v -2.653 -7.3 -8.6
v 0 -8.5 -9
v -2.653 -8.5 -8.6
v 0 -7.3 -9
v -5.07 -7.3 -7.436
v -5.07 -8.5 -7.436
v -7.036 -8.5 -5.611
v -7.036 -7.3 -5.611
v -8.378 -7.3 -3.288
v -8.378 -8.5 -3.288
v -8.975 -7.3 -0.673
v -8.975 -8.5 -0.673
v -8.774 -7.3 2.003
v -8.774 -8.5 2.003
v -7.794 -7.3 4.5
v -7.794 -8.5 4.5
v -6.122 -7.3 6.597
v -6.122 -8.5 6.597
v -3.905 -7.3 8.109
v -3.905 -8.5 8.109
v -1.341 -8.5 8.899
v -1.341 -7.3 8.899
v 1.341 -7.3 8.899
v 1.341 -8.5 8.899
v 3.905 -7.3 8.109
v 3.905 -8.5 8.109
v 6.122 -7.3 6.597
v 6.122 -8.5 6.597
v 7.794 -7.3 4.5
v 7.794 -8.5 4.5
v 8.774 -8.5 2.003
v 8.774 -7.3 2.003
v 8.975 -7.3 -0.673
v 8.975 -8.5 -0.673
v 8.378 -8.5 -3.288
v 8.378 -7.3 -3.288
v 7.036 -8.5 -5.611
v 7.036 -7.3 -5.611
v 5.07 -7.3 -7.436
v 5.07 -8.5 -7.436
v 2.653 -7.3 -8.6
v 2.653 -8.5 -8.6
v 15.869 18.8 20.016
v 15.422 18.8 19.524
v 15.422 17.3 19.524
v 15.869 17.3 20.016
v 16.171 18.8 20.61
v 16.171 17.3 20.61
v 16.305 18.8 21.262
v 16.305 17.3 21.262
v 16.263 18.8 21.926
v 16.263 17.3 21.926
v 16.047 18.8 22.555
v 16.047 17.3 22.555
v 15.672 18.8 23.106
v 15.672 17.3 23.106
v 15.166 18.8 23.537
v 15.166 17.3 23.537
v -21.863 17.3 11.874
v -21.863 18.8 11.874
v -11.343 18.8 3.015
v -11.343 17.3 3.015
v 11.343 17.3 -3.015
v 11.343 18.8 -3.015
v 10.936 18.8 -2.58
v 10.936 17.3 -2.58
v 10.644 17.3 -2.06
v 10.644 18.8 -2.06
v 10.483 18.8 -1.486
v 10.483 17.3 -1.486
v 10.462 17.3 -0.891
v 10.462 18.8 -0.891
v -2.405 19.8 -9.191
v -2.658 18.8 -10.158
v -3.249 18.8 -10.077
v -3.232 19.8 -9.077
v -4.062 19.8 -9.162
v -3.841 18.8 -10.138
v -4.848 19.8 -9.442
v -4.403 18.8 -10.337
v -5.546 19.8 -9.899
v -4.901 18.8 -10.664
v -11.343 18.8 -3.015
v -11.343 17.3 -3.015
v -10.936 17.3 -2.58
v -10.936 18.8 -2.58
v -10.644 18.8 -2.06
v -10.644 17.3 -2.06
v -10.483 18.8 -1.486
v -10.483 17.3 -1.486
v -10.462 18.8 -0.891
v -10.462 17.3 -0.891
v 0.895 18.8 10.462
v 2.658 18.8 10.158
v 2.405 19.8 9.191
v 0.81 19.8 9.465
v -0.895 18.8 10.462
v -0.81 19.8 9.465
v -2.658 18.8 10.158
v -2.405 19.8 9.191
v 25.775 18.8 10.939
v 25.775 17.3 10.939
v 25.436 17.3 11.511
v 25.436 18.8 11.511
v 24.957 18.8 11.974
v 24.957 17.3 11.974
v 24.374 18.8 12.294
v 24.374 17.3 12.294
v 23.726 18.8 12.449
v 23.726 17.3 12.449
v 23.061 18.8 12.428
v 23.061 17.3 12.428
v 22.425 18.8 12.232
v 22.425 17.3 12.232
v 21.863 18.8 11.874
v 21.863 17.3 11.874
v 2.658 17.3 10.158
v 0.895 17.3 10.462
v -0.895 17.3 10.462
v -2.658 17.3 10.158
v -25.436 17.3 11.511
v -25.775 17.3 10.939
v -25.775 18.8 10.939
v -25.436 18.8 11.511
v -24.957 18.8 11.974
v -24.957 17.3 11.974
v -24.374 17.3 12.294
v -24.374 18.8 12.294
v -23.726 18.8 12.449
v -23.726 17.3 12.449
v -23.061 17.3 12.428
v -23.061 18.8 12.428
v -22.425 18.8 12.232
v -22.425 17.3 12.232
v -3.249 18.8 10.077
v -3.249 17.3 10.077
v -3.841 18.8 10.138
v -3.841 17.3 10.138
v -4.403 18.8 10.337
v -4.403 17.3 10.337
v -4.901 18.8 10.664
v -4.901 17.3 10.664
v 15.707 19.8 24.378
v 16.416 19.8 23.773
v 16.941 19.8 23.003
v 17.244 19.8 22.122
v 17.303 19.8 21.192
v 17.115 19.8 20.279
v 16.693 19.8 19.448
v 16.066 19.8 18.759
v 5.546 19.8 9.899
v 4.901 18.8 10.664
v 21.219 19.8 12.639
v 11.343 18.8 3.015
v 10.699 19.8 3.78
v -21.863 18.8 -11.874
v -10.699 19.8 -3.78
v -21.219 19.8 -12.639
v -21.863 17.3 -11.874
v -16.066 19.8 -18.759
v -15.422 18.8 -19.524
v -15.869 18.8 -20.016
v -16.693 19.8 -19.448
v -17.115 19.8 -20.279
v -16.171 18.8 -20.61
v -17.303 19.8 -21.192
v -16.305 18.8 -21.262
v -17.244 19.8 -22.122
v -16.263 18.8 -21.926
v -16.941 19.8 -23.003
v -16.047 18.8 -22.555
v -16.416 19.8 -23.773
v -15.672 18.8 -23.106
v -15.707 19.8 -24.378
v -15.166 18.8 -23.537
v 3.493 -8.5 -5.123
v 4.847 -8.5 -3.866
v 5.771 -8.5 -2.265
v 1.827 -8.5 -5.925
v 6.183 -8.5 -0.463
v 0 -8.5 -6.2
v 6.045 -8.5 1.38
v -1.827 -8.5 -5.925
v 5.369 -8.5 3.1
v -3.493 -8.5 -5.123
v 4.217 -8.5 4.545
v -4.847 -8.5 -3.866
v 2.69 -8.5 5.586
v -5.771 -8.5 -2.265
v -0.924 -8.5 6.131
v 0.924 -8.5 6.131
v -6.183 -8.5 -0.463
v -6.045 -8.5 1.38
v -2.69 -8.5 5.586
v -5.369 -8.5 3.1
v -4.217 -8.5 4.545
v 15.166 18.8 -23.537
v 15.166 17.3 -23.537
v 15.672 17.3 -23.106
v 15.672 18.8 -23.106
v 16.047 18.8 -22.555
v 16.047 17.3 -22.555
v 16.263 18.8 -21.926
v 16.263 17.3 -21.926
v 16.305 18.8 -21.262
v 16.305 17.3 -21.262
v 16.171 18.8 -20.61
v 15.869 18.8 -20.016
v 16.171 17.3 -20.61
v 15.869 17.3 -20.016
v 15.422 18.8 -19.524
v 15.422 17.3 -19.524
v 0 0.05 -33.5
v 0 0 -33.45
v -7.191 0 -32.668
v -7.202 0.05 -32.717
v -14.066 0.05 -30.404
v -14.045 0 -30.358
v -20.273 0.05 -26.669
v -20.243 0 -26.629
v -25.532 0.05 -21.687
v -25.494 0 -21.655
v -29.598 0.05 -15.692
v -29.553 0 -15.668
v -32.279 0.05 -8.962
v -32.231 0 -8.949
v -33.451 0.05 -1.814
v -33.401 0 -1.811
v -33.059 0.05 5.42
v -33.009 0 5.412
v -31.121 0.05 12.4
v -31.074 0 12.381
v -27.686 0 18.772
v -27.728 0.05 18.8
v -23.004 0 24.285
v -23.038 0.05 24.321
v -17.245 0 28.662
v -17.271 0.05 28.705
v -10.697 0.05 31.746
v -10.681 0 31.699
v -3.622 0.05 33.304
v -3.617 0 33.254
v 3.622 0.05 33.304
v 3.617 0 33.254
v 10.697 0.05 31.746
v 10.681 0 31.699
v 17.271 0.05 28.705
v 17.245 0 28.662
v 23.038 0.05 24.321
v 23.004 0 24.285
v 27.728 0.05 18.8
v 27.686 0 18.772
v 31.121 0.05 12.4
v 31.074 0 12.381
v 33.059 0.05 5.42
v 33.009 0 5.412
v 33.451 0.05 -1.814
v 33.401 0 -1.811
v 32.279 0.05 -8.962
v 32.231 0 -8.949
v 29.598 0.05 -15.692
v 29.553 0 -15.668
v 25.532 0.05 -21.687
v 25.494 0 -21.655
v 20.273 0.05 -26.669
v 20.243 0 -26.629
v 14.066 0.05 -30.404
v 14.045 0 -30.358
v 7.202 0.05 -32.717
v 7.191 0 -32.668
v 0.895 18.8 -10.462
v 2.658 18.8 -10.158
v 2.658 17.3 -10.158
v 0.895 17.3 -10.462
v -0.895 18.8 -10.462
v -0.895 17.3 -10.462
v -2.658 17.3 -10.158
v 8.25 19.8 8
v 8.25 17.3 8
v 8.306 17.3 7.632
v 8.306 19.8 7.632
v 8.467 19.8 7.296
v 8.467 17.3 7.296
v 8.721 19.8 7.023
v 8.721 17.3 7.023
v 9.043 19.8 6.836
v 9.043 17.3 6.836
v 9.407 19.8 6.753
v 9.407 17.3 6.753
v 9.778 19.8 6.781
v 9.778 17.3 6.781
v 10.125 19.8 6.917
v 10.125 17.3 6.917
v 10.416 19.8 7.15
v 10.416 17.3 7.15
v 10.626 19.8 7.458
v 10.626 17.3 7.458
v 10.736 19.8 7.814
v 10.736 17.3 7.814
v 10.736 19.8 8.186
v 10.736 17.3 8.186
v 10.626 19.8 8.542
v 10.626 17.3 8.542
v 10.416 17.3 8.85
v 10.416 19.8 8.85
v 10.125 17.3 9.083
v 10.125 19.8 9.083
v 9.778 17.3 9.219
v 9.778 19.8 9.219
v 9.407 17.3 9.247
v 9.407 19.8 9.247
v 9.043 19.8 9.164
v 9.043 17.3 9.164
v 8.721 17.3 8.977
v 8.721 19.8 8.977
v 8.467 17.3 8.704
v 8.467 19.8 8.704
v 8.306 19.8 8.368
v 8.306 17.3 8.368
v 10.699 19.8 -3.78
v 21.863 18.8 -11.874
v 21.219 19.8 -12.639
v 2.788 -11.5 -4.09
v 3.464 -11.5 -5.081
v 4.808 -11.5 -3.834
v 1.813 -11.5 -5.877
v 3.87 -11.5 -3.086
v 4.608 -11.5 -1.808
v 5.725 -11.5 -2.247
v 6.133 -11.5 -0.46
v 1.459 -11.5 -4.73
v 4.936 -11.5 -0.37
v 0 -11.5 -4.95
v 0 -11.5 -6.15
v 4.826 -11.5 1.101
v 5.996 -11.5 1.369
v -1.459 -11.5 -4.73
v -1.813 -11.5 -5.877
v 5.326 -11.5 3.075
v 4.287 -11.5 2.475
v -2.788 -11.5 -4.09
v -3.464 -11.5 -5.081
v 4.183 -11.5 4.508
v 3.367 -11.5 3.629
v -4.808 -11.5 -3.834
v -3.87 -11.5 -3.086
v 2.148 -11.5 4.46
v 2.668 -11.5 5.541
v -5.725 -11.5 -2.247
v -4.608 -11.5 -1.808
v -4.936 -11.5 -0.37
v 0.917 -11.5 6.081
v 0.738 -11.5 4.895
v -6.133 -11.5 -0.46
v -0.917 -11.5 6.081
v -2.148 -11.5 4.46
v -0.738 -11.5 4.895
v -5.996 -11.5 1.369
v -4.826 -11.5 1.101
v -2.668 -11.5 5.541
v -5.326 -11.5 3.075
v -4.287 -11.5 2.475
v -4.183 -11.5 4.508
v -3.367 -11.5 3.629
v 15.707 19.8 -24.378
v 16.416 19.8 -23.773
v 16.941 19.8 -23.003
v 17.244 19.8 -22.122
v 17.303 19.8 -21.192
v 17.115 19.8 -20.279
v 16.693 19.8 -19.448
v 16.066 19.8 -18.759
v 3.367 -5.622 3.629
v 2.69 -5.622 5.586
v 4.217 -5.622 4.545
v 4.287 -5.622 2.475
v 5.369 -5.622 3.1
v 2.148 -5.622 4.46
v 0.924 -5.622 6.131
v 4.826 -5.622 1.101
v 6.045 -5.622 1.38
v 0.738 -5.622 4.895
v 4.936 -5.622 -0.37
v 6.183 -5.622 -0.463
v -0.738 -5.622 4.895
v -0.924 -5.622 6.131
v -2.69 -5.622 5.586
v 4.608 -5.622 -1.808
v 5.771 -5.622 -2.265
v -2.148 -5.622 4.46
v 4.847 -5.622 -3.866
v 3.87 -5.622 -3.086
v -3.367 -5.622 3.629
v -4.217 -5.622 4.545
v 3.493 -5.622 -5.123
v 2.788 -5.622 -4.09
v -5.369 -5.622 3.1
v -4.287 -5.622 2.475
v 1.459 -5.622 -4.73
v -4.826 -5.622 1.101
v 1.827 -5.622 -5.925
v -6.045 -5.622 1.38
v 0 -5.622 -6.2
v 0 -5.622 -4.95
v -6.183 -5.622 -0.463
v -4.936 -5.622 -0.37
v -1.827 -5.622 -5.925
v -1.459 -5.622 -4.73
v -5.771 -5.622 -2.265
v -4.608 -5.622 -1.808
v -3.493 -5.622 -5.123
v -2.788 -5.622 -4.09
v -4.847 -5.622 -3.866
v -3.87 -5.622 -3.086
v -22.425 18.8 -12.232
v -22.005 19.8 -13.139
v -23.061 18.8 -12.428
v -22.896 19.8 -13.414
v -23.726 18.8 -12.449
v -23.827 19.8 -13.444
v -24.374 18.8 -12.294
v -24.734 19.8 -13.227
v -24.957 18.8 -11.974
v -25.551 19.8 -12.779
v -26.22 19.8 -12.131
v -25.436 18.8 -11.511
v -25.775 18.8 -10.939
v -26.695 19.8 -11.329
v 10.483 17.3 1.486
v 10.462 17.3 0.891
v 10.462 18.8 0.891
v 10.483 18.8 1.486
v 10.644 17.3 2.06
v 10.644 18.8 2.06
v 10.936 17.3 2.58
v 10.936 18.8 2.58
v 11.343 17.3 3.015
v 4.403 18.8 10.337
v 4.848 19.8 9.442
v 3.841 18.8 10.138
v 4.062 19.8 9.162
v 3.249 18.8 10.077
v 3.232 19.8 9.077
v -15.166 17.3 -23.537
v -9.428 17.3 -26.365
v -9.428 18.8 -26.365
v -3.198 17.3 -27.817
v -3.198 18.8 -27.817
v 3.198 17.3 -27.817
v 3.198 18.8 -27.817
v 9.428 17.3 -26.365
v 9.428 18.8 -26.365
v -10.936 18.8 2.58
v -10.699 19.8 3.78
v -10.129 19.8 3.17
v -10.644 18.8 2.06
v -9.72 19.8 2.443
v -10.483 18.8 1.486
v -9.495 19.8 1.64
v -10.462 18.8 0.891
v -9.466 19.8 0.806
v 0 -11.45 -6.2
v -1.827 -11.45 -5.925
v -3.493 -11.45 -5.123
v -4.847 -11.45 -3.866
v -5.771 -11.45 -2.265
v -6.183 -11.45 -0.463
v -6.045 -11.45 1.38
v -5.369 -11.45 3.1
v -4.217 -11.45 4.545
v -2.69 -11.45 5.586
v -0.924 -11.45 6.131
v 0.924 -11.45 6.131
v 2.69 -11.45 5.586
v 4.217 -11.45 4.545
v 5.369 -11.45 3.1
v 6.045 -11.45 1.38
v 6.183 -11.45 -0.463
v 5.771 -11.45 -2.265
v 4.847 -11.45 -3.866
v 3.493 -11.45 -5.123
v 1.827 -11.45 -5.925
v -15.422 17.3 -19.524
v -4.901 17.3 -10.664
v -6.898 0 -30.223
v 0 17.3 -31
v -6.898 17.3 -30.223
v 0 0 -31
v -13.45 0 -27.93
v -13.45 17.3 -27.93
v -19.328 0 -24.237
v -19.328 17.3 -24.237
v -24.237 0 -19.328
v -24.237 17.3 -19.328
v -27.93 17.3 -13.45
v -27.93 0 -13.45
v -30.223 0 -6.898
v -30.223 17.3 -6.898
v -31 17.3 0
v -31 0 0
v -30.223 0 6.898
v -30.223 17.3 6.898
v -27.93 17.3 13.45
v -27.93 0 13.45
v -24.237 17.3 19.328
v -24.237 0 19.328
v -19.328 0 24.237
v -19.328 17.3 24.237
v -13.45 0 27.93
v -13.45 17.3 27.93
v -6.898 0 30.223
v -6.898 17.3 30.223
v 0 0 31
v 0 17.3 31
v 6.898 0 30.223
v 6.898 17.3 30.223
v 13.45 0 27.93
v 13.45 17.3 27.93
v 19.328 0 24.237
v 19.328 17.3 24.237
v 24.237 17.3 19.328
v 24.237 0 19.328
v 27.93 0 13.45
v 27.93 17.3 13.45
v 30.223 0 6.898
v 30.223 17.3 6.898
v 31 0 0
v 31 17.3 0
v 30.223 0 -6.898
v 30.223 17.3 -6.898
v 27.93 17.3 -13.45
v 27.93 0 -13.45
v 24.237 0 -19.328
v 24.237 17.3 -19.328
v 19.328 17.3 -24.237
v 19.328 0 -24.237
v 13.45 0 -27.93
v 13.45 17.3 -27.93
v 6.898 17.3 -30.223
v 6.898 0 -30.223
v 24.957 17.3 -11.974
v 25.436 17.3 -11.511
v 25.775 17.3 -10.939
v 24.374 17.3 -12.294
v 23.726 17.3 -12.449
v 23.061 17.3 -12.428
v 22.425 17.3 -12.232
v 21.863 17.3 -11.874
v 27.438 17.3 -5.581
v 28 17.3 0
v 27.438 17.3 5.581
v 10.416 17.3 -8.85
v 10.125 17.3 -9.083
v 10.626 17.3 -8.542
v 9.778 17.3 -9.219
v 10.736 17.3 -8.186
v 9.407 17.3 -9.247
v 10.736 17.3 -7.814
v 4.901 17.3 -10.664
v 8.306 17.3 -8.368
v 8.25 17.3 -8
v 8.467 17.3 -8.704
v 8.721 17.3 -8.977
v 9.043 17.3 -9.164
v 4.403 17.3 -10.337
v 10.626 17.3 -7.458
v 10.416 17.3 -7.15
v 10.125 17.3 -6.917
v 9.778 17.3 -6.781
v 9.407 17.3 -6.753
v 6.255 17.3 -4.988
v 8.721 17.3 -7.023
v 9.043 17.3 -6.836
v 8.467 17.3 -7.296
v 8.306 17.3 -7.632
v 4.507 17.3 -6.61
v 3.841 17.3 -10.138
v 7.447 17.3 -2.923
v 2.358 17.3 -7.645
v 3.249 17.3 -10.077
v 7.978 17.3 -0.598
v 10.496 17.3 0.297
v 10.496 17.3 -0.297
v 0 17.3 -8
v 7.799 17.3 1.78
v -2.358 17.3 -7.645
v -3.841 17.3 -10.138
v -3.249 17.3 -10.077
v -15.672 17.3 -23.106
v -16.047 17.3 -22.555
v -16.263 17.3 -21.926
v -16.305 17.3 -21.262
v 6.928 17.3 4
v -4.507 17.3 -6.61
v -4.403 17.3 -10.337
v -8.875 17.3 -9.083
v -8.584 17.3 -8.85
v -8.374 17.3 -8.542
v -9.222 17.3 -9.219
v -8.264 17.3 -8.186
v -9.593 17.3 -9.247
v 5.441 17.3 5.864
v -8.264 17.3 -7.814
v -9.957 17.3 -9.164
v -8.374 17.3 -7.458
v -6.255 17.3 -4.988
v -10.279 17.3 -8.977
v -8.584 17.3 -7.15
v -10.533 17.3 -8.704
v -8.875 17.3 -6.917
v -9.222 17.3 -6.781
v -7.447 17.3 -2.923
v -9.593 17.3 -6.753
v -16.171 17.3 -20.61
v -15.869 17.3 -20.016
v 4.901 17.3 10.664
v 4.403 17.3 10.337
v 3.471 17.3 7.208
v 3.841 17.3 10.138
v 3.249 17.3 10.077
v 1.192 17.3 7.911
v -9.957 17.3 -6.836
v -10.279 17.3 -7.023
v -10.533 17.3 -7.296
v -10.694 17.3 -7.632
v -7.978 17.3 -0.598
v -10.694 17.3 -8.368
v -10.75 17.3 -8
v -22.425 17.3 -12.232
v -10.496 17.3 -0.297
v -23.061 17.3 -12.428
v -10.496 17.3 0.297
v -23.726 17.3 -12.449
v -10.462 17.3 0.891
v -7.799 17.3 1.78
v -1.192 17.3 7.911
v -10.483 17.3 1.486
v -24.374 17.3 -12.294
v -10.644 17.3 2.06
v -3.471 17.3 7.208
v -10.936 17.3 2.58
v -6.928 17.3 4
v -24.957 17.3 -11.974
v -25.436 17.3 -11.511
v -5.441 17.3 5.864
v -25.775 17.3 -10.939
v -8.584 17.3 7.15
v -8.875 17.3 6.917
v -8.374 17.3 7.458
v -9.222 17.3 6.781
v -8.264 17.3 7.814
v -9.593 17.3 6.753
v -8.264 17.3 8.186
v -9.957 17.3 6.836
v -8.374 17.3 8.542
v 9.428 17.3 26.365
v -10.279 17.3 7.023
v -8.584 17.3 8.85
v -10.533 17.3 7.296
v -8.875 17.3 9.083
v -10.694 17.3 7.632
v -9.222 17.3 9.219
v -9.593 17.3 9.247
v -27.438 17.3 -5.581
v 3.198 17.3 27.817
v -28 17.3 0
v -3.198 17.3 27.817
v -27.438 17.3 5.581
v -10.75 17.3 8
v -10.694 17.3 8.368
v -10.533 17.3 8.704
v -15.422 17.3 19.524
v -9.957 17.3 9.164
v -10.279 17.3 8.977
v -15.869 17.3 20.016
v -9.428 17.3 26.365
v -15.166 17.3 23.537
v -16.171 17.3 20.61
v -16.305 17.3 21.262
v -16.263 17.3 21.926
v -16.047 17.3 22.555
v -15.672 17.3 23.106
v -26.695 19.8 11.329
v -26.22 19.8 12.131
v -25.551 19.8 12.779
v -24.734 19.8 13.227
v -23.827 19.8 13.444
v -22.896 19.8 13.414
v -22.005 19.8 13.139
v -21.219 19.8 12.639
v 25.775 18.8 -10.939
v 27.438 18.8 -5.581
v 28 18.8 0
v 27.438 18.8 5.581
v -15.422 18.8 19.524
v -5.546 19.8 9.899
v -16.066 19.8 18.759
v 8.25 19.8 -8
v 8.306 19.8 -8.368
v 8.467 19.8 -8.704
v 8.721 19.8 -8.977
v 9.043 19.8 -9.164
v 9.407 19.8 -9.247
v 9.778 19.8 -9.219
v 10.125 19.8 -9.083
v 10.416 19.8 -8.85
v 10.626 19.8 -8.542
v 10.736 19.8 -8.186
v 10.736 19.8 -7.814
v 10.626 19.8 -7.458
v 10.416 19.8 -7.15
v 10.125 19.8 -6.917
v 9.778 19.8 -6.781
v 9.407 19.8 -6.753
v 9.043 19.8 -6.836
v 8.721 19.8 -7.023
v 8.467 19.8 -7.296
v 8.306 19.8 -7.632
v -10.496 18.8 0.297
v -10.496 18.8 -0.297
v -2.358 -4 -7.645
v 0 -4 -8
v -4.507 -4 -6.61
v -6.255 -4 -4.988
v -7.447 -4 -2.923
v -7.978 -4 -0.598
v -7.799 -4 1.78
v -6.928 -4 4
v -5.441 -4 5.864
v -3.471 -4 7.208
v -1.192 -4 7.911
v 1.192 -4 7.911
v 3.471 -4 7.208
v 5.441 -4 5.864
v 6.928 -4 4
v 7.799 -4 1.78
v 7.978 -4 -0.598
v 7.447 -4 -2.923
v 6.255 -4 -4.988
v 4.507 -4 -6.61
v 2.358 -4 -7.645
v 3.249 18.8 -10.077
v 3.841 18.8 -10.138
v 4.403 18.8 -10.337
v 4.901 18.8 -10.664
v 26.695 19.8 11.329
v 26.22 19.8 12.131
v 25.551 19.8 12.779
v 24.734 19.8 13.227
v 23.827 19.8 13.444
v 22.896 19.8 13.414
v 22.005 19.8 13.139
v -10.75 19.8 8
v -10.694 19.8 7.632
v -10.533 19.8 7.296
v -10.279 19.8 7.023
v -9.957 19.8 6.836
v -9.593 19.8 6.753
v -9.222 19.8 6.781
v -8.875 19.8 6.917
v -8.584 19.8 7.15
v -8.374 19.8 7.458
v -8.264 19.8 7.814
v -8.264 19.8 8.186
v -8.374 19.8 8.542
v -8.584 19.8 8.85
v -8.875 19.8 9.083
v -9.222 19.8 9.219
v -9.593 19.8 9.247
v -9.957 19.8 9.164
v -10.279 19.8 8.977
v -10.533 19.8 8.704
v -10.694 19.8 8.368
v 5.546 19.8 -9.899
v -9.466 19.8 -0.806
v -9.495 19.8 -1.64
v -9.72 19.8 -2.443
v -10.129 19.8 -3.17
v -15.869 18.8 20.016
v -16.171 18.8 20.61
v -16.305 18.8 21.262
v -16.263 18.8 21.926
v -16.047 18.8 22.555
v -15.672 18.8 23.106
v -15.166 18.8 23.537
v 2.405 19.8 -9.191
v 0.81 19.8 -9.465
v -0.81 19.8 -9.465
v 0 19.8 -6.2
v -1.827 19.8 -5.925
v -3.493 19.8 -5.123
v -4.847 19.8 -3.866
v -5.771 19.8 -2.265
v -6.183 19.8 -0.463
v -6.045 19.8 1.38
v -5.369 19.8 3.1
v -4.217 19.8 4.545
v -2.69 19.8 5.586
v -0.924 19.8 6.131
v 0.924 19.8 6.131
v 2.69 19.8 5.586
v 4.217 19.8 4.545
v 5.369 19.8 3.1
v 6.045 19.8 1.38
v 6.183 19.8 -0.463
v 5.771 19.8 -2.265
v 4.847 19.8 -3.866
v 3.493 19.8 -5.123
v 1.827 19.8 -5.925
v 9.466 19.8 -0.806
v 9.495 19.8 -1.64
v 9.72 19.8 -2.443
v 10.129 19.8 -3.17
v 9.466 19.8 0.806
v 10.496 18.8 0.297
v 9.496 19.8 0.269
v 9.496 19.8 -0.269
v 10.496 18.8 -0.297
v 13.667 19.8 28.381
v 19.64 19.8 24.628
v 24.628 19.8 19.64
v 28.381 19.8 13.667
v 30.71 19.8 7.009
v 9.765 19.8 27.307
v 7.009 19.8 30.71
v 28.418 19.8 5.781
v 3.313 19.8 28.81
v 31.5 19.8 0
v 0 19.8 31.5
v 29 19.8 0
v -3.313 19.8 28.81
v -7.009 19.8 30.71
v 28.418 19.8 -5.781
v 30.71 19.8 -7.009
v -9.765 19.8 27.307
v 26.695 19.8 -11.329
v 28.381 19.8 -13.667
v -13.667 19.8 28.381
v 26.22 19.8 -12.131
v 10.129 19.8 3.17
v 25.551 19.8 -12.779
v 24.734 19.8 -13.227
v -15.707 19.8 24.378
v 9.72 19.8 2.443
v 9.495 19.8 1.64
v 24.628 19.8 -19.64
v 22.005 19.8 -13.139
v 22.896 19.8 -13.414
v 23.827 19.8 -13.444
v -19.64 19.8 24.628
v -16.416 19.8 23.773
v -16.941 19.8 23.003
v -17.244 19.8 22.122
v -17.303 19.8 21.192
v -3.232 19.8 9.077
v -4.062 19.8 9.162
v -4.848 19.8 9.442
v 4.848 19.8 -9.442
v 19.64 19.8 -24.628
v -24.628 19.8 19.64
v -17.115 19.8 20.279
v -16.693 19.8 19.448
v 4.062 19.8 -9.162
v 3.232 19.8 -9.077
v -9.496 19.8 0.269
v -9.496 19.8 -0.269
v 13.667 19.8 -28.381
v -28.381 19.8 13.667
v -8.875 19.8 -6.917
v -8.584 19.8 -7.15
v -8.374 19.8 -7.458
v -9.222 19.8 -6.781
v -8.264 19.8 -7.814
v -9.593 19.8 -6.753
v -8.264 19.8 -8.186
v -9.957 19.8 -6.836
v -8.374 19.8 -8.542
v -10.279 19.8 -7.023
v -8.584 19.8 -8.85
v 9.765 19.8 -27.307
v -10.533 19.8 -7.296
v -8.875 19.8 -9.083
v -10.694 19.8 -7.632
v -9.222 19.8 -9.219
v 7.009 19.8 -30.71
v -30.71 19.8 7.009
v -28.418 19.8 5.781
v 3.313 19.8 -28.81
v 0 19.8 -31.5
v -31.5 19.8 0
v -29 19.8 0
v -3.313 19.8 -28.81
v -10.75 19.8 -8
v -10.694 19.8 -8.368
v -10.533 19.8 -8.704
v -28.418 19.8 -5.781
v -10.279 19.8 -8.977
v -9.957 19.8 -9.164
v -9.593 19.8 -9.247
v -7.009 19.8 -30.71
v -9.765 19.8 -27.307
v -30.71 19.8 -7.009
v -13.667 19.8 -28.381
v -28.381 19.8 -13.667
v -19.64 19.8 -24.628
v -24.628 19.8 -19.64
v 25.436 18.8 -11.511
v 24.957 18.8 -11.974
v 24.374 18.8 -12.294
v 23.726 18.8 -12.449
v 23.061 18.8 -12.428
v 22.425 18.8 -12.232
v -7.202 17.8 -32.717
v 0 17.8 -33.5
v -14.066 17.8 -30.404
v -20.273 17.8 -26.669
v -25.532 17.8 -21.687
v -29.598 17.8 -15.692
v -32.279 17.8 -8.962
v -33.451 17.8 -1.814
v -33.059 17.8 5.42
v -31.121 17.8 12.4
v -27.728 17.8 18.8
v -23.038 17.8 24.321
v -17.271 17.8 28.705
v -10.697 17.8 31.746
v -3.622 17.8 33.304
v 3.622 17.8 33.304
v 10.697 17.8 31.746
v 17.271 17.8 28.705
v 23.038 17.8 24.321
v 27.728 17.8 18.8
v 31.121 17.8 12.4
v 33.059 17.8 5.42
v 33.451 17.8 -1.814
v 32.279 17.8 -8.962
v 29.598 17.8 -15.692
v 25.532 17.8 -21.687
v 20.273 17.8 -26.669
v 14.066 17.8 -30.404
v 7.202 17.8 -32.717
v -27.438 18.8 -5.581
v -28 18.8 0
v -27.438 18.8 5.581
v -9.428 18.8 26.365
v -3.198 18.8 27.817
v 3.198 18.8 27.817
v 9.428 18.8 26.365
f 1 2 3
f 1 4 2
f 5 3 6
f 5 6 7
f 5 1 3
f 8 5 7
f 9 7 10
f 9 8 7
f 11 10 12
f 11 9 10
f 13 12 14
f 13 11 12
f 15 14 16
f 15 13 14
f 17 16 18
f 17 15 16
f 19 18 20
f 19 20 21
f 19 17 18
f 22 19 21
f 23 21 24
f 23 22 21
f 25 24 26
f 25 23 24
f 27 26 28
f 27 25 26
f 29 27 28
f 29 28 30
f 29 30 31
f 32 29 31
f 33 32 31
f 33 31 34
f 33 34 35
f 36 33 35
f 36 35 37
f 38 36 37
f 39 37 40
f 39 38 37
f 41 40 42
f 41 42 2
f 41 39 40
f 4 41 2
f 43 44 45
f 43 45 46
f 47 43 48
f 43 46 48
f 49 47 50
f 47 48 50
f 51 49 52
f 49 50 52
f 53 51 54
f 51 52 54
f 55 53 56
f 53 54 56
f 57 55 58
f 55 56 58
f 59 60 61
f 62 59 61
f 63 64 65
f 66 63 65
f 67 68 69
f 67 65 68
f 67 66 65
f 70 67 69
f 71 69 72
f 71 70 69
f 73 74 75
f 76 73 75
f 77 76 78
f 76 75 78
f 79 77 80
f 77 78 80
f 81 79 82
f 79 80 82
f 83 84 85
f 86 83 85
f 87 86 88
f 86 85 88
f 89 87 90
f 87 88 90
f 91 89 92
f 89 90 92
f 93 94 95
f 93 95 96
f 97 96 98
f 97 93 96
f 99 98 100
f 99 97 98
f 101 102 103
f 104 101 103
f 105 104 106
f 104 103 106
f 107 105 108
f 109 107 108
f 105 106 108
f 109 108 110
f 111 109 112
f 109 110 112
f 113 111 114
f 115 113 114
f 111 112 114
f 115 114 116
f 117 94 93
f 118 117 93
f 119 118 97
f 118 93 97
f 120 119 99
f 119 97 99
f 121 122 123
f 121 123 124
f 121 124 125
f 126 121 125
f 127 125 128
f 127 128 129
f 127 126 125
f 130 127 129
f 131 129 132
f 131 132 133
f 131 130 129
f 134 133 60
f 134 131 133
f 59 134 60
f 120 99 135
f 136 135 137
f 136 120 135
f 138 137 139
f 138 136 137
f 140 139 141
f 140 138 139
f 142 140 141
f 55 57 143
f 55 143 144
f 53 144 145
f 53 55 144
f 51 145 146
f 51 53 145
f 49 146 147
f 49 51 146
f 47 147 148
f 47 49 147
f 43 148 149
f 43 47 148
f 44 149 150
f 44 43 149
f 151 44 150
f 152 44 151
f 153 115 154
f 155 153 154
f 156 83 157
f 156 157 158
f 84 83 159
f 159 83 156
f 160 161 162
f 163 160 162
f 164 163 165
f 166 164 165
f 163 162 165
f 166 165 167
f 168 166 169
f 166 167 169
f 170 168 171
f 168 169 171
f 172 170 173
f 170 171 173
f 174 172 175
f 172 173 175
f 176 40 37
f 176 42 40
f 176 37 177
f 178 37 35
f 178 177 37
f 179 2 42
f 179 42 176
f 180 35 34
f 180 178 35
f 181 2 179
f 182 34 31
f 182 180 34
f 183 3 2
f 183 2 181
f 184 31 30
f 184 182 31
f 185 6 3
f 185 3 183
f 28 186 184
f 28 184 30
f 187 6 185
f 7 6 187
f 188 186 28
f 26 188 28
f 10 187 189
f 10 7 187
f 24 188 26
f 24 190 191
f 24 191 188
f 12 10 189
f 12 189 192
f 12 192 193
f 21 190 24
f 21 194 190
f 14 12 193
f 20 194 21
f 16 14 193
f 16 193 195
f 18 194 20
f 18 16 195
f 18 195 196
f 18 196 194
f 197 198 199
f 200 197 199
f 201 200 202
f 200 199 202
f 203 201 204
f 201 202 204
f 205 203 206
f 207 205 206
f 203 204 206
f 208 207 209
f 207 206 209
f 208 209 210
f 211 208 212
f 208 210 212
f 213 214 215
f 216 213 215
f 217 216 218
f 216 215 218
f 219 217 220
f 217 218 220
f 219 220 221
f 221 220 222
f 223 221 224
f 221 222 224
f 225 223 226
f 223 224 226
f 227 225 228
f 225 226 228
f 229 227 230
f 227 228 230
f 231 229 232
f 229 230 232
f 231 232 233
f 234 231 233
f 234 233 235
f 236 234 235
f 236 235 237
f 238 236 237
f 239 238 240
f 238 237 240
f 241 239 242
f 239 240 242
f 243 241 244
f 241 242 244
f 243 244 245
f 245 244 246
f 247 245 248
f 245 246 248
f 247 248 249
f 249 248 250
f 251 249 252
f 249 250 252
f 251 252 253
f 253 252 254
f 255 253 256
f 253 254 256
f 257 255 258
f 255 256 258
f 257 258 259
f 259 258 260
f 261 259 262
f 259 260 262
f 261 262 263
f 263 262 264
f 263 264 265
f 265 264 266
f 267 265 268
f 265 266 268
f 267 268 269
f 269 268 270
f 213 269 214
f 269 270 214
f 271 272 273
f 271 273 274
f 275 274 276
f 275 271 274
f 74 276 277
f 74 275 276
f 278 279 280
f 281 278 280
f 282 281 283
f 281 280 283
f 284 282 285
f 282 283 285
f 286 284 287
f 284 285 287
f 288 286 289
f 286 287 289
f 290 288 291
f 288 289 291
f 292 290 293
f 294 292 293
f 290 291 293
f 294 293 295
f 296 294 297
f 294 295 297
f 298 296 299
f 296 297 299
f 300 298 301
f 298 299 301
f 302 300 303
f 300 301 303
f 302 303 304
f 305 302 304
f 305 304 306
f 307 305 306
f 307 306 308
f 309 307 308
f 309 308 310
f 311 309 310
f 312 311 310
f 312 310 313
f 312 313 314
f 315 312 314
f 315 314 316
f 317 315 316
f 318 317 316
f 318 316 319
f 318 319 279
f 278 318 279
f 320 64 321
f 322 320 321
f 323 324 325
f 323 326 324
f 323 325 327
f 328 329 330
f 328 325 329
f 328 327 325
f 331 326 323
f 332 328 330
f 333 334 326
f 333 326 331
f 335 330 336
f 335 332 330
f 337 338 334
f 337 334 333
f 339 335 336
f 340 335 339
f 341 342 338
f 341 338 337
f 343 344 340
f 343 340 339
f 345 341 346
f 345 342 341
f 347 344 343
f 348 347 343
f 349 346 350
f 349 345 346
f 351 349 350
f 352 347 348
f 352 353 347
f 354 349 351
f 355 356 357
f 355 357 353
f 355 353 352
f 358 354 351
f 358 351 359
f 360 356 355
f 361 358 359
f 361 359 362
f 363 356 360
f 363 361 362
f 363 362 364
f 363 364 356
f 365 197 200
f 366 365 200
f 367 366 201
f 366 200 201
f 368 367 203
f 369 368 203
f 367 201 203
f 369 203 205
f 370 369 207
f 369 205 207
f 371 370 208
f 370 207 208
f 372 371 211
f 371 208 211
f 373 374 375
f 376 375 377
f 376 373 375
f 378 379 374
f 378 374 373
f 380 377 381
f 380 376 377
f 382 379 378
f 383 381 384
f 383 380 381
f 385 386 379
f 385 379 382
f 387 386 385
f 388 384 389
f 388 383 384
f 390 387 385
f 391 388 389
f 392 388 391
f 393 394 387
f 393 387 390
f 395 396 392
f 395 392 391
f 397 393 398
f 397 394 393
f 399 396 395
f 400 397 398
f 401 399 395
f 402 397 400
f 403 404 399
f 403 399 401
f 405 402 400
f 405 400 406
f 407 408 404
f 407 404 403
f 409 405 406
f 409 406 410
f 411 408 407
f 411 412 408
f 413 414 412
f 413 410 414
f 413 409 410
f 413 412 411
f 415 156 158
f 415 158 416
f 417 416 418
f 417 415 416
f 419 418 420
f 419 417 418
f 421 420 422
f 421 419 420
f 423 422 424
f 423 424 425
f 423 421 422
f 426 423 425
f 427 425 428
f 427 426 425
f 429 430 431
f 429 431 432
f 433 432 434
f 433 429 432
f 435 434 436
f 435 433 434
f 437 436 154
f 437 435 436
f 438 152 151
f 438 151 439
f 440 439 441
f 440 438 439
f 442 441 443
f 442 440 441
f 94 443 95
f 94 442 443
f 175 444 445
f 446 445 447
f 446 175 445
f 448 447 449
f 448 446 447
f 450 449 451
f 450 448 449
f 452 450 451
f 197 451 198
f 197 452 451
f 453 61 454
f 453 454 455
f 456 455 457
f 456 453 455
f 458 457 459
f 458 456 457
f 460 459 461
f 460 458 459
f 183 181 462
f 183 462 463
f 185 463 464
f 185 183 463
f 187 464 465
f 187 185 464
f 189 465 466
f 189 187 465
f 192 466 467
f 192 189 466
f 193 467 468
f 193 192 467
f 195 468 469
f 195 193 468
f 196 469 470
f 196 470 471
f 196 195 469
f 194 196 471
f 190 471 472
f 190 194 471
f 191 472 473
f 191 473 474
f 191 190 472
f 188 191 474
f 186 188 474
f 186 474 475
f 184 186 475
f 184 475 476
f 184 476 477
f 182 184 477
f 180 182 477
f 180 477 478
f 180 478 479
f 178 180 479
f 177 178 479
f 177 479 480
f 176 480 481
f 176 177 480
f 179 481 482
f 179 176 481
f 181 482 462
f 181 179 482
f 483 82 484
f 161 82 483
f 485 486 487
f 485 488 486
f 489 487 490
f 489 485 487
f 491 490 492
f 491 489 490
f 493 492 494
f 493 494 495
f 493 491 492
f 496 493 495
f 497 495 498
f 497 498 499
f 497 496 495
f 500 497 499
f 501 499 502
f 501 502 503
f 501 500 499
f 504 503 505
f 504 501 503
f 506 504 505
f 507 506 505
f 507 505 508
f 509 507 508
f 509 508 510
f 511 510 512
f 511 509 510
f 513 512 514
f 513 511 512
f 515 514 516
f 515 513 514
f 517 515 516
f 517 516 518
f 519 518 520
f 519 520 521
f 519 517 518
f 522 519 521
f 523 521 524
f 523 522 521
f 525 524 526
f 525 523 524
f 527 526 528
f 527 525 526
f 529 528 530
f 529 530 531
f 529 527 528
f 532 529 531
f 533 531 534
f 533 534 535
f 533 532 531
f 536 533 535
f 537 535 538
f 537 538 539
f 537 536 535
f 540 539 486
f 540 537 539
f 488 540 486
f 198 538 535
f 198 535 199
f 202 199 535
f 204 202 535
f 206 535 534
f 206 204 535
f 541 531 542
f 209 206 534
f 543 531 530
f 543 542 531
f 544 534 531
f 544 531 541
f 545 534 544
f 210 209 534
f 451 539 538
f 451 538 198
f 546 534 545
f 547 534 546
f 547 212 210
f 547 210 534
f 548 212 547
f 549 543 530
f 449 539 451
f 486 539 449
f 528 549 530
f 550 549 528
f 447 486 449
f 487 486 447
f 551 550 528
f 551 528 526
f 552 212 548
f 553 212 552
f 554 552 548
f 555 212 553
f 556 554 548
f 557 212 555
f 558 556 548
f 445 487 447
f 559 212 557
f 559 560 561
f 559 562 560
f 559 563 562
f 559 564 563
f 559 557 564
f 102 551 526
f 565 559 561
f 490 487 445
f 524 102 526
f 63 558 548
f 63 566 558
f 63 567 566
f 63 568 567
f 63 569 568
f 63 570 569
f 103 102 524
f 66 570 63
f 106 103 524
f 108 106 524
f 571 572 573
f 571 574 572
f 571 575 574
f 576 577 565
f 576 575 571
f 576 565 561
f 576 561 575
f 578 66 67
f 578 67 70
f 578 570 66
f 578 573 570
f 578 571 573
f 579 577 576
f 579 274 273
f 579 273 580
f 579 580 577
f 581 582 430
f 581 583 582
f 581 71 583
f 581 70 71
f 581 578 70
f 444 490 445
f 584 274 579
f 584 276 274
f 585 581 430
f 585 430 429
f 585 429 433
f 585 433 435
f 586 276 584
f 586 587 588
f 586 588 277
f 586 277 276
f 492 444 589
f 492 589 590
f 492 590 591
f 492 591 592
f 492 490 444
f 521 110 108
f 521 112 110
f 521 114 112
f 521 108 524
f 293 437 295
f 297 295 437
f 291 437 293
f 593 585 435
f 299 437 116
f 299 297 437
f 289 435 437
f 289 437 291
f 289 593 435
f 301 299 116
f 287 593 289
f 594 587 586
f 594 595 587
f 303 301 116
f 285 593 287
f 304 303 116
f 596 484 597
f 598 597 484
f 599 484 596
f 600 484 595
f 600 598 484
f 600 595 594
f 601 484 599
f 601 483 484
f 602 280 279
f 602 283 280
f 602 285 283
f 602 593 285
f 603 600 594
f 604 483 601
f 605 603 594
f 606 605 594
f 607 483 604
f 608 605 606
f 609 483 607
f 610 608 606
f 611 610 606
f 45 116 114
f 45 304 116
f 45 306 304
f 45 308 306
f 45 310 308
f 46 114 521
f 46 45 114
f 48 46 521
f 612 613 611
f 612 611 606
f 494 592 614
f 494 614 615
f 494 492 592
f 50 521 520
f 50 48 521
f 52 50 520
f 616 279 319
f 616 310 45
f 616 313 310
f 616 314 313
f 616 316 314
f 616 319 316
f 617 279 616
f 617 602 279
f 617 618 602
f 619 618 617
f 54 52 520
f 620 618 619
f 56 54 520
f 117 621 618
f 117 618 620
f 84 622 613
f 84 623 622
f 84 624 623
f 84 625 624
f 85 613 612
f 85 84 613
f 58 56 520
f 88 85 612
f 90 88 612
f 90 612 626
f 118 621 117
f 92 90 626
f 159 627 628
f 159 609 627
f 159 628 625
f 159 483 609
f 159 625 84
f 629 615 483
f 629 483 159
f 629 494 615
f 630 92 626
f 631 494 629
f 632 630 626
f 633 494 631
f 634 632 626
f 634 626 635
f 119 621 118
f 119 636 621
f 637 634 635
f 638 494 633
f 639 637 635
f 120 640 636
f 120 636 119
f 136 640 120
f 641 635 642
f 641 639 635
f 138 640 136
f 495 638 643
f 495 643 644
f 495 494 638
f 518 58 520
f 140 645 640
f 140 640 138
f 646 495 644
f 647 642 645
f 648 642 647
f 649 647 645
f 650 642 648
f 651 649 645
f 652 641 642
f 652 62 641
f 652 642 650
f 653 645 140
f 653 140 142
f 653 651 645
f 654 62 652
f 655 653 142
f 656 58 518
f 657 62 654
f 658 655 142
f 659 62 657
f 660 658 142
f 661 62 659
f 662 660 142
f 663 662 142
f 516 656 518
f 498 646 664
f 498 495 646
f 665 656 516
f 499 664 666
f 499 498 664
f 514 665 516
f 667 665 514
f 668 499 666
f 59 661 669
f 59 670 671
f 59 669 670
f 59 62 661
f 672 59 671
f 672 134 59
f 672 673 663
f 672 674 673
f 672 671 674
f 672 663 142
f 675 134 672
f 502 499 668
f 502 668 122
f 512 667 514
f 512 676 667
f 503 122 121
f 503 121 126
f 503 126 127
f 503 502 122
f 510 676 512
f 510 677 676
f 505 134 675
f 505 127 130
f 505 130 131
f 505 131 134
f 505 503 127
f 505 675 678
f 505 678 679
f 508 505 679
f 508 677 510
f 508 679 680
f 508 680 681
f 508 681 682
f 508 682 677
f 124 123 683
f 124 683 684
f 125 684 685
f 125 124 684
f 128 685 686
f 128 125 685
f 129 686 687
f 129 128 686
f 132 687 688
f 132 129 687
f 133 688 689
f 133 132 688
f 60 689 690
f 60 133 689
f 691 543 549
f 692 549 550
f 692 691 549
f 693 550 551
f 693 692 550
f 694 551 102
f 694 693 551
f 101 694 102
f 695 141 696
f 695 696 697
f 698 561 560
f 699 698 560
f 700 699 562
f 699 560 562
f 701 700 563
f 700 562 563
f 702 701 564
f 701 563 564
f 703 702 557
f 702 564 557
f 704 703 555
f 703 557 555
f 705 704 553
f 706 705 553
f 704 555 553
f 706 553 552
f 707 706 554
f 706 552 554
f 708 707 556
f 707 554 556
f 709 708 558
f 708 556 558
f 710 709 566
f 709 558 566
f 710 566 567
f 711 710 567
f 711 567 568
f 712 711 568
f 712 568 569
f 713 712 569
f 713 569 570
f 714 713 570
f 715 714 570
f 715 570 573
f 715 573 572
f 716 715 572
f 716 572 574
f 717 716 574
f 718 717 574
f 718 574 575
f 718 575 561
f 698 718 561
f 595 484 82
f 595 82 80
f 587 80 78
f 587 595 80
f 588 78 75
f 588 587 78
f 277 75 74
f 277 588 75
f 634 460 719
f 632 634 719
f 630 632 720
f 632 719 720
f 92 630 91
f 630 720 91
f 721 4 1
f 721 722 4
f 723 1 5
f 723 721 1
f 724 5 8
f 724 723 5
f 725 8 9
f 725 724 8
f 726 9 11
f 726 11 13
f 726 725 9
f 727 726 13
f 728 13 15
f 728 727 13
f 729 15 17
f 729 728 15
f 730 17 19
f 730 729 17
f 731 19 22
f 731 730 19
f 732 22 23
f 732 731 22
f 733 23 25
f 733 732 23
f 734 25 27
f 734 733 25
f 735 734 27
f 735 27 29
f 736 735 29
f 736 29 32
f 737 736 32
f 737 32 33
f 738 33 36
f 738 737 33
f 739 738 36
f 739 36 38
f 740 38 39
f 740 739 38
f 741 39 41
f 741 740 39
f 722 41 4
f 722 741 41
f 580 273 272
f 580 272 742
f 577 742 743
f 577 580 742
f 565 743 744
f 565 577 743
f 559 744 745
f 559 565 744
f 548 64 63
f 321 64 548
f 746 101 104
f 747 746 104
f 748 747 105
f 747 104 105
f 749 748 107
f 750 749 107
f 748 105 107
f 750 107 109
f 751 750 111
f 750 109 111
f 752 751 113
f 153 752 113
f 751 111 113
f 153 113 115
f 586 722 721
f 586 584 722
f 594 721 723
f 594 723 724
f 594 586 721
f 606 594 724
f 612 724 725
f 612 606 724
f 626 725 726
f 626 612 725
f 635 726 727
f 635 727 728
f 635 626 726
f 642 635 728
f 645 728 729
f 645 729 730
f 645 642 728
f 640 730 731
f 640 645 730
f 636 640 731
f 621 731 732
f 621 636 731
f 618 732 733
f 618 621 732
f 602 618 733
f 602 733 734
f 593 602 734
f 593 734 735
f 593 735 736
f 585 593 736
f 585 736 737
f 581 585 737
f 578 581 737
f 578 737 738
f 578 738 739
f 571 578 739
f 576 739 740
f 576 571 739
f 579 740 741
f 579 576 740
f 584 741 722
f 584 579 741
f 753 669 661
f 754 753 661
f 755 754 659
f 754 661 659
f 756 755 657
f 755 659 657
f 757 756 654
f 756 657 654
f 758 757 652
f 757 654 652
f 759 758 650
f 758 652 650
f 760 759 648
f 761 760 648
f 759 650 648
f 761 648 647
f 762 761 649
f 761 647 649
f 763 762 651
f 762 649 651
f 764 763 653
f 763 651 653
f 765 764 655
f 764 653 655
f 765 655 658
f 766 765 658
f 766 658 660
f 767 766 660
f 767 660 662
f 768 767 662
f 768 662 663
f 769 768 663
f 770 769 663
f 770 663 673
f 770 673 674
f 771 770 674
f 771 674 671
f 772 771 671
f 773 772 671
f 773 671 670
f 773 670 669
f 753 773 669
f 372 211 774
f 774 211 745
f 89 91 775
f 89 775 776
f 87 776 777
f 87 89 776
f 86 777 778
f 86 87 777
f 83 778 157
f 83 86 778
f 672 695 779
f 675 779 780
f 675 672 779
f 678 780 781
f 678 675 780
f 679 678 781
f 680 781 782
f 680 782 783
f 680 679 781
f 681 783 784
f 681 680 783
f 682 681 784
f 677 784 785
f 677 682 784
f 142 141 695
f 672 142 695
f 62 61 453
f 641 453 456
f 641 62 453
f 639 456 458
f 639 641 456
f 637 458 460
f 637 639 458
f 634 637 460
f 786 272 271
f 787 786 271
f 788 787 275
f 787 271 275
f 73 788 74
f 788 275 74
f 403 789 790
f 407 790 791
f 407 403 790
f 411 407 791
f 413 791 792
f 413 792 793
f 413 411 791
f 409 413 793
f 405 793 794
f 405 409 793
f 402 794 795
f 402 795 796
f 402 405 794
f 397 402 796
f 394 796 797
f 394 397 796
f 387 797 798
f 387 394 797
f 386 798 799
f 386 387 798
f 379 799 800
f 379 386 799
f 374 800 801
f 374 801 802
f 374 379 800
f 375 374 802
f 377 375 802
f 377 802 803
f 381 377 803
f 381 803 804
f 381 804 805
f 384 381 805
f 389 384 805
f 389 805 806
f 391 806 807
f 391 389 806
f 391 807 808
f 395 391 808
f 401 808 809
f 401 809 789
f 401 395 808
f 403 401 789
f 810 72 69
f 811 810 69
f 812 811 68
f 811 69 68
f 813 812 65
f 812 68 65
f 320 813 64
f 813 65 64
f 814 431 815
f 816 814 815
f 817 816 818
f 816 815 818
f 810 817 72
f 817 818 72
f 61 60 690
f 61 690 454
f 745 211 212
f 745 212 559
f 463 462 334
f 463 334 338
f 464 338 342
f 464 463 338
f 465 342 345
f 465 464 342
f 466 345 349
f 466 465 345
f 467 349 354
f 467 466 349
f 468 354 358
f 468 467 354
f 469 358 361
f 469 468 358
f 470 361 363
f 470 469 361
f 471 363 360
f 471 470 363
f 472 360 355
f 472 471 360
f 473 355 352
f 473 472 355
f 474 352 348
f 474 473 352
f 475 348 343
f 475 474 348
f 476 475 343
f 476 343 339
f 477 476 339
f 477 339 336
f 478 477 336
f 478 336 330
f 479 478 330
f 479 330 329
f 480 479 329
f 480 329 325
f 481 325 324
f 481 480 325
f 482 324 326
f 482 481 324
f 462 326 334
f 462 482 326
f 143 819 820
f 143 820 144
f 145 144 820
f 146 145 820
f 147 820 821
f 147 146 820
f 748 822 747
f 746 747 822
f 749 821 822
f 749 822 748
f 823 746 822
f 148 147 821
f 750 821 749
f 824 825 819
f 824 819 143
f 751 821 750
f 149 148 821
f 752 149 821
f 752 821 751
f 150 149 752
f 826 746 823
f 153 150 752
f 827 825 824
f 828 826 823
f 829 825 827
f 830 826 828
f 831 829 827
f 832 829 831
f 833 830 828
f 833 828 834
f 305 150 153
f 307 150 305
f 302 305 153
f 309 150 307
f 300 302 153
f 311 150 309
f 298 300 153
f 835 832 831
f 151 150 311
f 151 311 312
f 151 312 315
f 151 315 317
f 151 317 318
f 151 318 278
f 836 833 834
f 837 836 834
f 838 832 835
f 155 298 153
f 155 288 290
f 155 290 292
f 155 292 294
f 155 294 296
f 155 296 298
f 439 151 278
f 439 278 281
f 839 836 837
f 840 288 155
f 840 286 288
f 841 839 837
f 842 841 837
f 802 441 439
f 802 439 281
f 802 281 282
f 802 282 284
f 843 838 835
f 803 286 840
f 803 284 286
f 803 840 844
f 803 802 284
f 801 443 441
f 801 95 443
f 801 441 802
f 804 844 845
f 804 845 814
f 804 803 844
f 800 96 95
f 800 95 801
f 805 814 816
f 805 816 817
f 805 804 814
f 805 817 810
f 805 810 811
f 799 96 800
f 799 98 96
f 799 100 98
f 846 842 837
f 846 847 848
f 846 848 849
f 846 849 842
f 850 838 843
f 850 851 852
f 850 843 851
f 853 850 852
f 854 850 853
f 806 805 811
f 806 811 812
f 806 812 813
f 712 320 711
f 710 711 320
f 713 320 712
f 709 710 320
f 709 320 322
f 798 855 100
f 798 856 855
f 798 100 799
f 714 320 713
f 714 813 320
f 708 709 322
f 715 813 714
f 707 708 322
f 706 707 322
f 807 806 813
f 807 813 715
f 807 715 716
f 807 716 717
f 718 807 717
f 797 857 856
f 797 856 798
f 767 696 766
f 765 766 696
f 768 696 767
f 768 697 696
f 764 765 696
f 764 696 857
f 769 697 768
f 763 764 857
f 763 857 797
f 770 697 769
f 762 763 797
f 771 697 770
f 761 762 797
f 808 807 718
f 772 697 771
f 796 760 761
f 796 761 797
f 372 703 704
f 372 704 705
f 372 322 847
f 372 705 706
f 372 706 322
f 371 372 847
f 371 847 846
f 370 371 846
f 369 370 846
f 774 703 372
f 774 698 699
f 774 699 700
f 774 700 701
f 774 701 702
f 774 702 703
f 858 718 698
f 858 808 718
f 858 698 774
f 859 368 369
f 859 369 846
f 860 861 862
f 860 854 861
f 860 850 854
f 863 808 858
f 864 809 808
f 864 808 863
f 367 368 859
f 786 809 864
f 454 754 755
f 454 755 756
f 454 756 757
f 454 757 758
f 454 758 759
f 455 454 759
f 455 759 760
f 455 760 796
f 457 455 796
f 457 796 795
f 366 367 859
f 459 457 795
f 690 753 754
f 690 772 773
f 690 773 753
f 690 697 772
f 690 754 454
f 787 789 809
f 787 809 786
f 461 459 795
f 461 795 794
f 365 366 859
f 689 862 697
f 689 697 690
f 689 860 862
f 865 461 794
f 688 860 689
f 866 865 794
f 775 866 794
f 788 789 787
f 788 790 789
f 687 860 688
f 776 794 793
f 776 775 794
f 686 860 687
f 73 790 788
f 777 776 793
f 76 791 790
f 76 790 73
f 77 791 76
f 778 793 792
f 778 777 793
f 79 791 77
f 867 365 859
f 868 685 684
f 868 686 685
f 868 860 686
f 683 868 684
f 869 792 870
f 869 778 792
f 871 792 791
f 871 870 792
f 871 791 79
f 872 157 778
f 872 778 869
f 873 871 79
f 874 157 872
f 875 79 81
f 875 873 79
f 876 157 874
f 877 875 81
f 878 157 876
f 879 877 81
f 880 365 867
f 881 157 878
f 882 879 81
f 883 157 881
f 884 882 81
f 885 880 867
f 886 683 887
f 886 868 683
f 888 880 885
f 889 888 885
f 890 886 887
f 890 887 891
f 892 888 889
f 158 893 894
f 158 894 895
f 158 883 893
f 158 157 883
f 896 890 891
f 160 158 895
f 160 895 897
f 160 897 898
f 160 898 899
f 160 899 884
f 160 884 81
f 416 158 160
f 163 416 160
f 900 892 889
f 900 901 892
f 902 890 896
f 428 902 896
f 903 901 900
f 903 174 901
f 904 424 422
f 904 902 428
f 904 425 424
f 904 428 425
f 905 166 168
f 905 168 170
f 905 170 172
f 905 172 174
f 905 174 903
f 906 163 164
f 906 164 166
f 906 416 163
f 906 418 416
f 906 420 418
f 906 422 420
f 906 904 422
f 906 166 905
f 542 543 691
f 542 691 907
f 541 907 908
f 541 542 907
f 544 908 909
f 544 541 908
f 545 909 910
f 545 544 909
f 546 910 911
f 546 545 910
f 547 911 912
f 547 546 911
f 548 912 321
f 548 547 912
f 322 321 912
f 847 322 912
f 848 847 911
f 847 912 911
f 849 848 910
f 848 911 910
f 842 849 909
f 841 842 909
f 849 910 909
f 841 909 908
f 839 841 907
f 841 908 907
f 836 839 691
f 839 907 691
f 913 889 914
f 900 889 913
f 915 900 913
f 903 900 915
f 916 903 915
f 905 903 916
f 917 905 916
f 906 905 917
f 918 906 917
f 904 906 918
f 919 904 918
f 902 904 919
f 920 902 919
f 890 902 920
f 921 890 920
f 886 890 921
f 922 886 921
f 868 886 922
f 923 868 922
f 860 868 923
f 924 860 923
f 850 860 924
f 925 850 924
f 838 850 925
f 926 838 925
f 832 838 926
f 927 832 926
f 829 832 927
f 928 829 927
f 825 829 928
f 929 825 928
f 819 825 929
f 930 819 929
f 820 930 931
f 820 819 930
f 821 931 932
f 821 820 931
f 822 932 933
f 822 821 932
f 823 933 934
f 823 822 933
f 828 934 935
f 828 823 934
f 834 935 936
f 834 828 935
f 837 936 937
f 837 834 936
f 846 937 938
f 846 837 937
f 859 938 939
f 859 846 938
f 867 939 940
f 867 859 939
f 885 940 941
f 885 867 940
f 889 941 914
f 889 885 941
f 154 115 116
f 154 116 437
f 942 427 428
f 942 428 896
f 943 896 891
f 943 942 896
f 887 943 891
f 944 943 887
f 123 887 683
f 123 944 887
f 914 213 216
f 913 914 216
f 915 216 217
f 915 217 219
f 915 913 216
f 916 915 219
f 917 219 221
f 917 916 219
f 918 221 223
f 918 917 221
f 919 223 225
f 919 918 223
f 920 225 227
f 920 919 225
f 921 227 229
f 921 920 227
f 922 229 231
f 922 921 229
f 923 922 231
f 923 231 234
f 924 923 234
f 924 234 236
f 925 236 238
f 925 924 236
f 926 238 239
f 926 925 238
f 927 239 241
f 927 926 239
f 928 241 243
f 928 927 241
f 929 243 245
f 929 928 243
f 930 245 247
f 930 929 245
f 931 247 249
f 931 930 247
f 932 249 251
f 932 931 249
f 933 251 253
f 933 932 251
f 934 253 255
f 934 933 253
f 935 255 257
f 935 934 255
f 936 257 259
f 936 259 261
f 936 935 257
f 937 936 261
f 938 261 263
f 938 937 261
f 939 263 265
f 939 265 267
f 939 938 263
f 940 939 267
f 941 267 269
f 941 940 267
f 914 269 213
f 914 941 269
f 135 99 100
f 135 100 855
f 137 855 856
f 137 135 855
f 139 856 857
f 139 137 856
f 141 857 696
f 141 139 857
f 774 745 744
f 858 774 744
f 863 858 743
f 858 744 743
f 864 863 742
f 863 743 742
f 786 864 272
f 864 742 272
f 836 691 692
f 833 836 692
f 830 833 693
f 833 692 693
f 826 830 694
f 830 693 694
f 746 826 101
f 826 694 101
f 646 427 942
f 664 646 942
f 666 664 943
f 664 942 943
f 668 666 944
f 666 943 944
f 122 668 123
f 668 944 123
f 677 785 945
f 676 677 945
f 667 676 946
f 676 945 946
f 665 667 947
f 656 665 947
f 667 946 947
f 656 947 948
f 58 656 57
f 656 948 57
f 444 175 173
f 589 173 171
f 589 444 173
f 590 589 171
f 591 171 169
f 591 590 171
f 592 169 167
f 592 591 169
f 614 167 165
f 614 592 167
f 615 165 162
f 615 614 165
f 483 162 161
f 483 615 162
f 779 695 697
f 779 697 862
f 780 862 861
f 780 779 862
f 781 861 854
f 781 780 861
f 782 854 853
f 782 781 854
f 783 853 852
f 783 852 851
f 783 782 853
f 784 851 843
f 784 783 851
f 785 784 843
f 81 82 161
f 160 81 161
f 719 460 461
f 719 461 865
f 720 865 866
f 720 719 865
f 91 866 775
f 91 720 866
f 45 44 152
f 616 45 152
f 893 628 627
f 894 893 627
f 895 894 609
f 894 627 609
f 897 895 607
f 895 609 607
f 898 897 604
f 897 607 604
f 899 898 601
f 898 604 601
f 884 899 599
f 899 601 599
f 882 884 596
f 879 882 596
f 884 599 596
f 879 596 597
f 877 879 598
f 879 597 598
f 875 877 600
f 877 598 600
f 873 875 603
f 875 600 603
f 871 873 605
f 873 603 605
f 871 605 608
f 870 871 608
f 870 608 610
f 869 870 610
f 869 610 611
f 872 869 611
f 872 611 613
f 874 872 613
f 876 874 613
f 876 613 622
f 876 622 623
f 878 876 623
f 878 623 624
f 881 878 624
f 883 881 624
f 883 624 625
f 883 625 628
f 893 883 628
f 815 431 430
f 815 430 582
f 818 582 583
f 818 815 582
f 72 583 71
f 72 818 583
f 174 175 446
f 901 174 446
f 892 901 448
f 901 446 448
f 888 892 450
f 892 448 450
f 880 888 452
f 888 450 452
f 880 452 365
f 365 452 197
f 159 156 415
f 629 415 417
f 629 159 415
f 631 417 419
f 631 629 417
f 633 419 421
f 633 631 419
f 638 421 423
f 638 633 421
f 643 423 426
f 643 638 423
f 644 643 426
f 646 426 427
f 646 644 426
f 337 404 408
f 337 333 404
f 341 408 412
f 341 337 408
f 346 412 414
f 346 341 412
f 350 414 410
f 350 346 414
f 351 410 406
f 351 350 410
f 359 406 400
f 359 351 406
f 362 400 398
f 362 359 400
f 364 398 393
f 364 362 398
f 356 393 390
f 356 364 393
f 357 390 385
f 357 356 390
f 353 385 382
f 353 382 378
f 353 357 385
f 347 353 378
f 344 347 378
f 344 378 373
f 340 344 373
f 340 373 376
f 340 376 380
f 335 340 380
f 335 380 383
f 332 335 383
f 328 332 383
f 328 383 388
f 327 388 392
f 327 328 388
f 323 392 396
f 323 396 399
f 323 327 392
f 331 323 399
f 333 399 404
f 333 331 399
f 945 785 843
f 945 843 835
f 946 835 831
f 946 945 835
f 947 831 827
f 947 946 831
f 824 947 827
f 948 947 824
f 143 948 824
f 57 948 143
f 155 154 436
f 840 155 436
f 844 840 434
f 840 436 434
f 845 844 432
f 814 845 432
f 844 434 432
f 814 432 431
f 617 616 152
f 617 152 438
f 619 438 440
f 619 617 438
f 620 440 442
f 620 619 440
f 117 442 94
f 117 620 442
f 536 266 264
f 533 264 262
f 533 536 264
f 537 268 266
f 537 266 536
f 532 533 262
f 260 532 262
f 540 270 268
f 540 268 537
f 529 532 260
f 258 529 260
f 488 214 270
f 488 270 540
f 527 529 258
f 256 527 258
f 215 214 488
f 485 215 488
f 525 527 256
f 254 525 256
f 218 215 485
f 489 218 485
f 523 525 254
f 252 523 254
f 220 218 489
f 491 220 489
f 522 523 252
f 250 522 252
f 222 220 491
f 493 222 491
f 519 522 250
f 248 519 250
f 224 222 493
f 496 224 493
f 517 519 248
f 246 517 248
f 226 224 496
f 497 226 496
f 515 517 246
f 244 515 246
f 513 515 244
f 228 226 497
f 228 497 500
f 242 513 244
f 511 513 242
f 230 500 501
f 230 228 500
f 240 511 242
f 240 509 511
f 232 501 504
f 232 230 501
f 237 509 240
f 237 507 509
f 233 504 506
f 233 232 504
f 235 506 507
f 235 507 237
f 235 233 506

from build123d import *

# Parameters (mm, degrees)
HOLE_WIZARD_M3_1_D  = 2.5
CUT_EXTRUDE_1_DEPTH = 10
CHAMFER_1_SIZE      = 2
FILLET_1_R          = 2.5
CHAMFER_2_SIZE      = 1
CHAMFER_3_SIZE      = 0.05
CHAMFER_4_SIZE      = 0.05


with BuildPart() as part:
    # 草图6 → 旋转1 (revolve)
    with BuildSketch(Plane.XY, mode=Mode.PRIVATE) as revolve_1_sk:
        Polygon((33.5, 0), (33.5, 19.8), (6.2, 19.8), (6.2, -5.621788423), (4.95, -5.621788423), (4.95, -11.5), (6.2, -11.5), (6.2, -8.5), (9, -8.5), (9, -7.3), (8, -4), (8, 17.3), (31, 17.3), (31, 0), align=None)
    revolve(revolve_1_sk.sketch.rotate(Axis((0, 0, 0), (0, 1, 0)), 90), axis=Axis((0, 0, 0), (0, 1, 0)))

    # M3 螺纹孔1 (through all)
    with Locations(Plane(origin=(0, 19.8, 0), x_dir=(1, 0, 0), z_dir=(0, 1, 0))):
        with Locations((9.5, -8), (-9.5, -8), (-9.5, 8), (9.5, 8)):
            Hole(HOLE_WIZARD_M3_1_D / 2)

    # 草图11 → 切除-拉伸1 (cut)
    with BuildSketch(Plane(origin=(0, 19.8, 0), x_dir=(1, 0, 0), z_dir=(0, 1, 0))):
        with BuildLine():
            Line((17.852590074, 21.570466561), (3.841817237, 9.771921015))
            ThreePointArc((3.841817237, 9.771921015), (0, 10.5), (-3.841817237, 9.771921015))
            Line((-3.841817237, 9.771921015), (-17.852590074, 21.570466561))
            ThreePointArc((-17.852590074, 21.570466561), (0, 28), (17.852590074, 21.570466561))
        make_face()
        with BuildLine():
            Line((24.293947531, -13.92135458), (10.283174695, -2.122809033))
            ThreePointArc((10.283174695, -2.122809033), (10.5, 0), (10.283174695, 2.122809033))
            Line((10.283174695, 2.122809033), (24.293947531, 13.92135458))
            ThreePointArc((24.293947531, 13.92135458), (28, 0), (24.293947531, -13.92135458))
        make_face()
        with BuildLine():
            Line((17.852590074, -21.570466561), (3.841817237, -9.771921015))
            ThreePointArc((3.841817237, -9.771921015), (0, -10.5), (-3.841817237, -9.771921015))
            Line((-3.841817237, -9.771921015), (-17.852590074, -21.570466561))
            ThreePointArc((-17.852590074, -21.570466561), (0, -28), (17.852590074, -21.570466561))
        make_face()
        with BuildLine():
            Line((-10.283174695, 2.122809033), (-24.293947531, 13.92135458))
            ThreePointArc((-24.293947531, 13.92135458), (-28, 0), (-24.293947531, -13.92135458))
            Line((-24.293947531, -13.92135458), (-10.283174695, -2.122809033))
            ThreePointArc((-10.283174695, -2.122809033), (-10.5, 0), (-10.283174695, 2.122809033))
        make_face()
    extrude(amount=-CUT_EXTRUDE_1_DEPTH, mode=Mode.SUBTRACT)

    # 倒角1
    chamfer_1_edges = [part.edges().sort_by_distance(p)[0] for p in [
        (0, 19.8, 33.5),
    ]]
    chamfer(chamfer_1_edges, length=CHAMFER_1_SIZE)

    # 圆角1
    fillet_1_edges = [part.edges().sort_by_distance(p)[0] for p in [
        (17.852590074, 18.55, 21.570466561),
        (-17.852590074, 18.55, 21.570466561),
        (-3.841817237, 18.55, 9.771921015),
        (3.841817237, 18.55, 9.771921015),
        (24.293947531, 18.55, -13.92135458),
        (24.293947531, 18.55, 13.92135458),
        (10.283174695, 18.55, 2.122809033),
        (10.283174695, 18.55, -2.122809033),
        (-24.293947531, 18.55, 13.92135458),
        (-24.293947531, 18.55, -13.92135458),
        (-10.283174695, 18.55, -2.122809033),
        (-10.283174695, 18.55, 2.122809033),
        (-17.852590074, 18.55, -21.570466561),
        (17.852590074, 18.55, -21.570466561),
        (3.841817237, 18.55, -9.771921015),
        (-3.841817237, 18.55, -9.771921015),
    ]]
    fillet(fillet_1_edges, radius=FILLET_1_R)

    # 倒角2
    chamfer_2_edges = [part.edges().sort_by_distance(p)[0] for p in [
        (0, 19.8, 28),
        (-10.161632191, 19.8, 15.093870449),
        (0, 19.8, 10.5),
        (10.161632191, 19.8, 15.093870449),
        (28, 19.8, 0),
        (16.602989649, 19.8, 7.444758468),
        (10.5, 19.8, 0),
        (16.602989649, 19.8, -7.444758468),
        (0, 19.8, -28),
        (10.161632191, 19.8, -15.093870449),
        (-10.161632191, 19.8, -15.093870449),
        (0, 19.8, -10.5),
        (-16.602989649, 19.8, 7.444758468),
        (-28, 19.8, 0),
        (-10.5, 19.8, 0),
        (-16.602989649, 19.8, -7.444758468),
        (-16.306405676, 19.8, 21.595078628),
        (-3.841486524, 19.8, 10.13784984),
        (3.841486524, 19.8, 10.13784984),
        (16.306405676, 19.8, 21.595078628),
        (24.055073585, 19.8, 12.393535487),
        (10.643709543, 19.8, 2.060210005),
        (10.643709543, 19.8, -2.060210005),
        (24.055073585, 19.8, -12.393535487),
        (16.306405676, 19.8, -21.595078628),
        (-16.306405676, 19.8, -21.595078628),
        (-3.841486524, 19.8, -10.13784984),
        (3.841486524, 19.8, -10.13784984),
        (-24.055073585, 19.8, 12.393535487),
        (-10.643709543, 19.8, 2.060210005),
        (-10.643709543, 19.8, -2.060210005),
        (-24.055073585, 19.8, -12.393535487),
    ]]
    chamfer(chamfer_2_edges, length=CHAMFER_2_SIZE)

    # 倒角3
    chamfer_3_edges = [part.edges().sort_by_distance(p)[0] for p in [
        (0, 0, 33.5),
    ]]
    chamfer(chamfer_3_edges, length=CHAMFER_3_SIZE)

    # 倒角4
    chamfer_4_edges = [part.edges().sort_by_distance(p)[0] for p in [
        (0, -11.5, 6.2),
    ]]
    chamfer(chamfer_4_edges, length=CHAMFER_4_SIZE)


solid = part.part
